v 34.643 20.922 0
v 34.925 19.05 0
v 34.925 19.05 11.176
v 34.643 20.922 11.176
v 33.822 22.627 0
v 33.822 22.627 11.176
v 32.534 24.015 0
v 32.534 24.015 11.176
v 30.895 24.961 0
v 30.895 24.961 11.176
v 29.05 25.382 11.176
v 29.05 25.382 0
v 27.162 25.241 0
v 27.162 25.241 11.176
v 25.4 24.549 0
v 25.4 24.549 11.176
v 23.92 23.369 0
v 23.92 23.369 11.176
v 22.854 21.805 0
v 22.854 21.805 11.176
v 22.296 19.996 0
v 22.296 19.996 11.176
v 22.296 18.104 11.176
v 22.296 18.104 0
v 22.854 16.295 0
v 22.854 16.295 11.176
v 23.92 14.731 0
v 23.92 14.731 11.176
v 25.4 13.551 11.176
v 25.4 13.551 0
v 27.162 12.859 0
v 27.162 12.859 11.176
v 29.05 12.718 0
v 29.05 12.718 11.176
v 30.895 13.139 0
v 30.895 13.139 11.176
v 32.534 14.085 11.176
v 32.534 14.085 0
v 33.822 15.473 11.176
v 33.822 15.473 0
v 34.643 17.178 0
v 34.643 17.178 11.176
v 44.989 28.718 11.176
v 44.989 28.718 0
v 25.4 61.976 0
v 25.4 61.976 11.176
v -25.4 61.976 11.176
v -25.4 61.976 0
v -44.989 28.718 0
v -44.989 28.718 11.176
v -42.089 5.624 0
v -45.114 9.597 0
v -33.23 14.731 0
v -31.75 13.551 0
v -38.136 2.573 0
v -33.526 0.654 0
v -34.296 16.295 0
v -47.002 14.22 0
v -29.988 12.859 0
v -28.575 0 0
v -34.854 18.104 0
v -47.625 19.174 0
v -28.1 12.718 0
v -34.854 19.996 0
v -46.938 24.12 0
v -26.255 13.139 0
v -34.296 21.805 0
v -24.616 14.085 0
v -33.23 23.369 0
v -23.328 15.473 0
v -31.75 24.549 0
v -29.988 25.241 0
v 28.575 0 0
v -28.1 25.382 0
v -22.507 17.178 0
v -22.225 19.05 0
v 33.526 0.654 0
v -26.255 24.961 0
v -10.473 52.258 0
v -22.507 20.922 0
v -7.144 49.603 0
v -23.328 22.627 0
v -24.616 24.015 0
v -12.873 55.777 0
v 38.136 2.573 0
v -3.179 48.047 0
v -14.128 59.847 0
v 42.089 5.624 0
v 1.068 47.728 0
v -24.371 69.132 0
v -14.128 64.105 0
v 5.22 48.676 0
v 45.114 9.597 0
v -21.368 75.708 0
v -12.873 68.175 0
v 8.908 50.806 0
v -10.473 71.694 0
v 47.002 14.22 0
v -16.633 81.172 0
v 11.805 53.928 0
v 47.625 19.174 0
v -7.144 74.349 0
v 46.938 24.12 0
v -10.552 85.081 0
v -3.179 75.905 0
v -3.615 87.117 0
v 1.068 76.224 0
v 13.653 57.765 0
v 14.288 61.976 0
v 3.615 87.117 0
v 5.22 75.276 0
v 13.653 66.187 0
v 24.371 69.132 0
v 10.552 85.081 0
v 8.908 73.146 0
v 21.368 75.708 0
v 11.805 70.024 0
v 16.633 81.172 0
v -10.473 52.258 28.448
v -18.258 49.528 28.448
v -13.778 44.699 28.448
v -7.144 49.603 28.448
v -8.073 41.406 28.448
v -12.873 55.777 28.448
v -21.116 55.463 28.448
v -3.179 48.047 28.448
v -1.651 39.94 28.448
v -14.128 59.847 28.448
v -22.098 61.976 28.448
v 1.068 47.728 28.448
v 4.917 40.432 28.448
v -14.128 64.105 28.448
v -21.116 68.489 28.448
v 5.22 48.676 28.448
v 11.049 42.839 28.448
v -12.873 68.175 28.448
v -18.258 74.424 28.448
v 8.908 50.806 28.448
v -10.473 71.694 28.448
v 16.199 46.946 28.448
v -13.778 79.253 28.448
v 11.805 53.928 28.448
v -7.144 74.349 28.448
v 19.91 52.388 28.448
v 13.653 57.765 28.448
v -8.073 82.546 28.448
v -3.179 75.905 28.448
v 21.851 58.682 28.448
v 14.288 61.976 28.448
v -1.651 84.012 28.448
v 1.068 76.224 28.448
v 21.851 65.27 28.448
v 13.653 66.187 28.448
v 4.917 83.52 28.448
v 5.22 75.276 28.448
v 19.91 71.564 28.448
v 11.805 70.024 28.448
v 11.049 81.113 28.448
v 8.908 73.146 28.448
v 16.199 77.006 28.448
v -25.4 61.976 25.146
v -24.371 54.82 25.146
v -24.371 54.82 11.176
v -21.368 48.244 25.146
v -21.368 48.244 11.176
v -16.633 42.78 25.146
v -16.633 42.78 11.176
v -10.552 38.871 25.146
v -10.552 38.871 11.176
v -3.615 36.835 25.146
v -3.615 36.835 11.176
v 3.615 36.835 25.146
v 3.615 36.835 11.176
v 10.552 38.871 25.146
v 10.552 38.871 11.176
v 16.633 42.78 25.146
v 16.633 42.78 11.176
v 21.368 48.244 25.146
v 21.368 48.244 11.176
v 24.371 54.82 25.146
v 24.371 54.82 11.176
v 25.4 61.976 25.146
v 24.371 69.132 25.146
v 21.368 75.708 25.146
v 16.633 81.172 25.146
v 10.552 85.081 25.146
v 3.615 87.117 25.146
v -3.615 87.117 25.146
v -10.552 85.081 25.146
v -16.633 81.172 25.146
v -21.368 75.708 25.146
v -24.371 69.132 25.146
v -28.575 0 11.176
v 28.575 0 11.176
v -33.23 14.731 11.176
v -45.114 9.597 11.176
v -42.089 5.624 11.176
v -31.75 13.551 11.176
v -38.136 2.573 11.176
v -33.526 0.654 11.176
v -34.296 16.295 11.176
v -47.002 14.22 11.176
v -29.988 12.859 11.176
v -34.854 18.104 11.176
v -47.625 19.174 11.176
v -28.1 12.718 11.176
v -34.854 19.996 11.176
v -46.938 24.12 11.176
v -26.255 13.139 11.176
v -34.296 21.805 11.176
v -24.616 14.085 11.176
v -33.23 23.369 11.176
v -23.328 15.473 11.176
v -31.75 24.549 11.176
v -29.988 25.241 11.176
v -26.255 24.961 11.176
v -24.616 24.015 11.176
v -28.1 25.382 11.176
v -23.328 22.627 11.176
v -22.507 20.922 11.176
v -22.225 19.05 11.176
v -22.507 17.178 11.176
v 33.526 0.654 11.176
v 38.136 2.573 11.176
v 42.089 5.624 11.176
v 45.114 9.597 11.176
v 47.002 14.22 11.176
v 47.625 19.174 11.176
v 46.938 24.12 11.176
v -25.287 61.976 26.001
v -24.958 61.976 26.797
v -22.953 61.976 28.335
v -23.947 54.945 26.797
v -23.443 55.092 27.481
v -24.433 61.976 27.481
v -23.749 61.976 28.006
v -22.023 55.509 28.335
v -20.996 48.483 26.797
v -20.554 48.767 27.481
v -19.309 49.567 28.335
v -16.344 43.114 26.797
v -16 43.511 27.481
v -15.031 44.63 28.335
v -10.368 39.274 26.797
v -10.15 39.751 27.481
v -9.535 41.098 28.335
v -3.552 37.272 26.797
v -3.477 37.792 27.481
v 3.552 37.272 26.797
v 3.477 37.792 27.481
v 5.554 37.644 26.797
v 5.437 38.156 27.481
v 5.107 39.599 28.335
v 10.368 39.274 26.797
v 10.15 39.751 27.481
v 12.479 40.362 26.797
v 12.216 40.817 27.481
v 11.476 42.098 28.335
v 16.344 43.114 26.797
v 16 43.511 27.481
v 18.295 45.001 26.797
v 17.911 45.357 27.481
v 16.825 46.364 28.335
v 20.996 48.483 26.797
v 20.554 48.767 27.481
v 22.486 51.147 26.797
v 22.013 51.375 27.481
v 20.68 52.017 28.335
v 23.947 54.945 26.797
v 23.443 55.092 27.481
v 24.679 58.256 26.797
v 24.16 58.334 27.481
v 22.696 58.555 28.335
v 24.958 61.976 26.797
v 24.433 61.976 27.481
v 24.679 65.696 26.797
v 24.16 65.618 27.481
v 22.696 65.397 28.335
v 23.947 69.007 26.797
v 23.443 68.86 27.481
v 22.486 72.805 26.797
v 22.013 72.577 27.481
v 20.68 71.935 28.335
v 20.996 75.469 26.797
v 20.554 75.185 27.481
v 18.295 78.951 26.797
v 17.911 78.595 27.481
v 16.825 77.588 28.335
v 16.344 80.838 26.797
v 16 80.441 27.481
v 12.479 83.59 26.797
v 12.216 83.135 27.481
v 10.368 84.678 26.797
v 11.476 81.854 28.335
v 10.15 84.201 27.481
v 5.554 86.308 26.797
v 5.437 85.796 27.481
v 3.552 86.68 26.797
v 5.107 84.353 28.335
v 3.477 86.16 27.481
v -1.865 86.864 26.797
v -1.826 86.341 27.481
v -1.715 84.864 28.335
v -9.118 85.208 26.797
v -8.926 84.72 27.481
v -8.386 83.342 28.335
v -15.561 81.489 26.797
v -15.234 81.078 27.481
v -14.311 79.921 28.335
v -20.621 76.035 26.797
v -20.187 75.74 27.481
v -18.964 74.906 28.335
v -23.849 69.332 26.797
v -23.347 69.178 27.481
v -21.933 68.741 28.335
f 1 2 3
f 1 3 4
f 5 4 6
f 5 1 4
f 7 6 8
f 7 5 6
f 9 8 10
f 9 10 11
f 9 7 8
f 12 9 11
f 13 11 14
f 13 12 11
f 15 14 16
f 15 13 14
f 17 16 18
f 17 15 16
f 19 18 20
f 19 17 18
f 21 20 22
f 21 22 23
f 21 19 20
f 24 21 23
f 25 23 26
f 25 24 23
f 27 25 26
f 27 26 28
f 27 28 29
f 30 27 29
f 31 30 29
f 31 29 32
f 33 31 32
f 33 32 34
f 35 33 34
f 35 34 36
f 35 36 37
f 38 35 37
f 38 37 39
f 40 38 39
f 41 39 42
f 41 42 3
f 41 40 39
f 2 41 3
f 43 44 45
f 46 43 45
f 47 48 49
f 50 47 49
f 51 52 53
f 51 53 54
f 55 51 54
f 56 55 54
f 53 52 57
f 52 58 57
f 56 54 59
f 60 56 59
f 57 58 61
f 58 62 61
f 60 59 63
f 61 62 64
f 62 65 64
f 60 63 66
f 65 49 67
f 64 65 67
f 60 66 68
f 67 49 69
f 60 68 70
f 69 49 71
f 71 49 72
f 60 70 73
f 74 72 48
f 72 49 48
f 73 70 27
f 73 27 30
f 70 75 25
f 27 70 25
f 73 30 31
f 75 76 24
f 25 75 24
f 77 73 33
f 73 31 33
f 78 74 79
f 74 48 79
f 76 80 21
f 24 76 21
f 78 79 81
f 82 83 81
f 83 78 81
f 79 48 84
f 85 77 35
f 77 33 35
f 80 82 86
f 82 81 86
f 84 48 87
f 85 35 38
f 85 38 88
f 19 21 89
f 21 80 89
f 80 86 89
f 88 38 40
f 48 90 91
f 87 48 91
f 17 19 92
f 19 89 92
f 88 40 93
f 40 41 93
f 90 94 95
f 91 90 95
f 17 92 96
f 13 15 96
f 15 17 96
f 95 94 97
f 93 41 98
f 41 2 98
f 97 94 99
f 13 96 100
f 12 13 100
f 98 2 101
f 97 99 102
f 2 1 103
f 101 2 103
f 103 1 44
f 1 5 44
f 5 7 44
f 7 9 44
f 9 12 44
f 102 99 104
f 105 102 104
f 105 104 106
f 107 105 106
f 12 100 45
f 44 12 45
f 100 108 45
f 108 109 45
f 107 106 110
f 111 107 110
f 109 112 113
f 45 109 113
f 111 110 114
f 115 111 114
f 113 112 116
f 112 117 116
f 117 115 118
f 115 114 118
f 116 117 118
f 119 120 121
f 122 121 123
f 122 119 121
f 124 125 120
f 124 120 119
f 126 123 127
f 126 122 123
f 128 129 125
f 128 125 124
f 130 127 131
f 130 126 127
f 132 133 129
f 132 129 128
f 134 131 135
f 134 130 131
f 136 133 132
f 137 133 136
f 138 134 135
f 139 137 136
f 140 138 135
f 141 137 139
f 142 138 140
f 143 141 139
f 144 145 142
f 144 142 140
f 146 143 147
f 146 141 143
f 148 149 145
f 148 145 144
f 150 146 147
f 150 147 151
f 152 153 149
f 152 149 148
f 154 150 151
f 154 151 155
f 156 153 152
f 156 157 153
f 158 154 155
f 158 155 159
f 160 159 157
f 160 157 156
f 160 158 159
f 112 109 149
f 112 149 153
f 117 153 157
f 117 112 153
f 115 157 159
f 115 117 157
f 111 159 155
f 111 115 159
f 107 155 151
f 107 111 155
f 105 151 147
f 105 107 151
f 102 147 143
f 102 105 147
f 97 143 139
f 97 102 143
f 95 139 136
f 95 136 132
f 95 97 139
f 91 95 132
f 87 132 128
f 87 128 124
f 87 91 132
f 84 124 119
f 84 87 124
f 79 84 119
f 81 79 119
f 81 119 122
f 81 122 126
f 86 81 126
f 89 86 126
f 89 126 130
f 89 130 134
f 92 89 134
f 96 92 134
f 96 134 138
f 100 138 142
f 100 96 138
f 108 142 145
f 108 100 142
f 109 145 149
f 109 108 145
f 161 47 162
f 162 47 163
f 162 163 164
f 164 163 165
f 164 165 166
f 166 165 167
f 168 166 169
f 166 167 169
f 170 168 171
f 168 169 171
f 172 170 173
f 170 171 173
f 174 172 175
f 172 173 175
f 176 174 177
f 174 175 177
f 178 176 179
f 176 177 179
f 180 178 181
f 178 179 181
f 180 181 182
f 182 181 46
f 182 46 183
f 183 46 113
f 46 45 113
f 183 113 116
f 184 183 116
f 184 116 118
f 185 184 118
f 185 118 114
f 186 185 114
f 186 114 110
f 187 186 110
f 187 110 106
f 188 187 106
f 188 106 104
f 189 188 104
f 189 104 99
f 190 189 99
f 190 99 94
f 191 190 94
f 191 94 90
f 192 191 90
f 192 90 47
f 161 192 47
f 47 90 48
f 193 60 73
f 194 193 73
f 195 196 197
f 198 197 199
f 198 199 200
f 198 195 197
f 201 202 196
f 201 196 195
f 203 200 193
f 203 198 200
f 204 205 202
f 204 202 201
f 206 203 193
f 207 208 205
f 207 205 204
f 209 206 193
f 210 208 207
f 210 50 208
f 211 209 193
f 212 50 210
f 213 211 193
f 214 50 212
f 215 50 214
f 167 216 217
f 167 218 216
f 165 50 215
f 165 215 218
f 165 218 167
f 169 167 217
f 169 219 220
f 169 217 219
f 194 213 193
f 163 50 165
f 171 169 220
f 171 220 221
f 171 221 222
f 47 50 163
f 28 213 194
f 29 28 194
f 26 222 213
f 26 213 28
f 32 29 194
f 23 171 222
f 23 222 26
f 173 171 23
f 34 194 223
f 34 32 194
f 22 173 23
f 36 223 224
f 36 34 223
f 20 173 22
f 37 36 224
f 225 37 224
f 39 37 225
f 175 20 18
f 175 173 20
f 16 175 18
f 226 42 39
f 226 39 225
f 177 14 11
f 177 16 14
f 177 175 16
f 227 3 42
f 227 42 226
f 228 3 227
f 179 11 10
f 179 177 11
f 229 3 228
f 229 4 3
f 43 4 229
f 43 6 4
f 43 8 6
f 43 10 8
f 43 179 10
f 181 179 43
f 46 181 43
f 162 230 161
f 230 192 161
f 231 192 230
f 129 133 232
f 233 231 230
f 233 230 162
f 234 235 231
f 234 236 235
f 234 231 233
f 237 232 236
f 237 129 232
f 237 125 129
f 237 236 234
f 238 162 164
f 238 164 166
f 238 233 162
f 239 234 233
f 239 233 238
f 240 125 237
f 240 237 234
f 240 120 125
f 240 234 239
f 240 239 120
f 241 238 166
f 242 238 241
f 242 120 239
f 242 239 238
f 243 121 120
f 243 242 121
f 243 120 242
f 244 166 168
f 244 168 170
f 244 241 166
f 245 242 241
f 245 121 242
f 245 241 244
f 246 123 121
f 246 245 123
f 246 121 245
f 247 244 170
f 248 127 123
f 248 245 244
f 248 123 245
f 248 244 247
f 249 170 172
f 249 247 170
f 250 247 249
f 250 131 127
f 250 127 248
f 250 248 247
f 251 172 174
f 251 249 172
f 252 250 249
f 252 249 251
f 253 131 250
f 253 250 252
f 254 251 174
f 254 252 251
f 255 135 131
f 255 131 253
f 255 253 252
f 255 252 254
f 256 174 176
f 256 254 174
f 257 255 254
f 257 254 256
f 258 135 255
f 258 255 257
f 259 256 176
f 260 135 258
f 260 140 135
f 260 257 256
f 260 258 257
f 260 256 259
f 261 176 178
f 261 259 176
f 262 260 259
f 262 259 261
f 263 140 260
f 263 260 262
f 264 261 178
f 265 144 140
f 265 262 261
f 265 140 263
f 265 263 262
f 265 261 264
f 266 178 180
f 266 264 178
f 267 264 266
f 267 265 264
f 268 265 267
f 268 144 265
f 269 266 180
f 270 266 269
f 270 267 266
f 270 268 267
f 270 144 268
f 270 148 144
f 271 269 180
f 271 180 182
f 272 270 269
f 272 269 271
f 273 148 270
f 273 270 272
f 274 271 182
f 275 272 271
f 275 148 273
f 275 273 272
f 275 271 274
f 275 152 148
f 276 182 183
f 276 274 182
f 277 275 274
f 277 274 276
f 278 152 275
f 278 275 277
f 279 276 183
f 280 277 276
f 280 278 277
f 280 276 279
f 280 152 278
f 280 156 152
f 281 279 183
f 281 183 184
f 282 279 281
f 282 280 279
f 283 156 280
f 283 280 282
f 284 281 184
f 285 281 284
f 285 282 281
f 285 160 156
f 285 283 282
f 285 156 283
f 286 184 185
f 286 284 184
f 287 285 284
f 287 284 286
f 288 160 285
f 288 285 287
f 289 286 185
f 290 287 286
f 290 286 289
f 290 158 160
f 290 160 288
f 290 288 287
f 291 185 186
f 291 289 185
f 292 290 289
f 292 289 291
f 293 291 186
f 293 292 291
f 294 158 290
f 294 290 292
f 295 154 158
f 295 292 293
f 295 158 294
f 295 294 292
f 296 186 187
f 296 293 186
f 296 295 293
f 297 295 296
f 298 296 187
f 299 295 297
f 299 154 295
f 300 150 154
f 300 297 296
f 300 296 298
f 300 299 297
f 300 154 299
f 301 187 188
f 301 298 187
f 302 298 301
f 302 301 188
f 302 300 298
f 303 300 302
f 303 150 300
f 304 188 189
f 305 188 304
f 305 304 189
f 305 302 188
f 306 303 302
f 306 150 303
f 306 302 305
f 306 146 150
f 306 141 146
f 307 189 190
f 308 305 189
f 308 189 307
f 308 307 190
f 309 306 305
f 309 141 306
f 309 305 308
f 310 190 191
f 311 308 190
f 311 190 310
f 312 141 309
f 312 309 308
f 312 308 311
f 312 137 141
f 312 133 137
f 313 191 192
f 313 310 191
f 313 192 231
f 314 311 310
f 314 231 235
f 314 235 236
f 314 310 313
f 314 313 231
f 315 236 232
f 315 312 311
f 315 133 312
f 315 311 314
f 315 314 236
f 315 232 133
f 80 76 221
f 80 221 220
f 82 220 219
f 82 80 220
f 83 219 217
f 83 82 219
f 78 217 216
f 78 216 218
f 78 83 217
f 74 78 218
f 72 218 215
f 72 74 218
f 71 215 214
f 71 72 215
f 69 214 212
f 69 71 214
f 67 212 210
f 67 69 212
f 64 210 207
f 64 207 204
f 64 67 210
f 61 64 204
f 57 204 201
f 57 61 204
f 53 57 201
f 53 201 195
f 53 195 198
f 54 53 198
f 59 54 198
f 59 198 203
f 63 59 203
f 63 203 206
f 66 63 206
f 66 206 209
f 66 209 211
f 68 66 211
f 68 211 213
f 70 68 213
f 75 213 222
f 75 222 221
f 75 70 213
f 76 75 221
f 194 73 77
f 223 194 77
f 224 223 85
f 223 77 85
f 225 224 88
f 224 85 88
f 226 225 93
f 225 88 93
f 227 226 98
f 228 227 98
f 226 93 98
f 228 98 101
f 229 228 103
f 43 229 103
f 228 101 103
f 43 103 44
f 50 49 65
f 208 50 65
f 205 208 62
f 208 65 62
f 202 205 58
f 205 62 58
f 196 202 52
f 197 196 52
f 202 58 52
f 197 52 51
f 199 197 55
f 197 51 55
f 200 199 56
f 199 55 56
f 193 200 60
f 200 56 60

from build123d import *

# Parameters (mm, degrees)
F0_R     = 14.2875
F1_DEPTH = 28.448
F0_R_2   = 6.35
F2_DEPTH = 11.176
F3_R     = 3.302


with BuildPart() as f1:
    # F0 (on Top) → F1 (new body)
    with BuildSketch(Plane.XY):
        with BuildLine():
            ThreePointArc((25.4, 61.976), (0, 87.376), (-25.4, 61.976))
            ThreePointArc((-25.4, 61.976), (0, 36.576), (25.4, 61.976))
        make_face()
        with Locations((0, 61.976)):
            Circle(F0_R, mode=Mode.SUBTRACT)
    extrude(amount=F1_DEPTH)

    # F0 (on Top) → F2 (join)
    with BuildSketch(Plane.XY):
        with BuildLine():
            Line((-28.575, 0), (0, 0))
            Line((0, 0), (28.575, 0))
            ThreePointArc((28.575, 0), (45.1140748574, 9.5968786709), (44.989265753, 28.7182149226))
            Line((44.989265753, 28.7182149226), (25.4, 61.976))
            ThreePointArc((25.4, 61.976), (0, 36.576), (-25.4, 61.976))
            Line((-25.4, 61.976), (-44.989265753, 28.7182149226))
            ThreePointArc((-44.989265753, 28.7182149226), (-45.1140748574, 9.5968786709), (-28.575, 0))
        make_face()
        with Locations((-28.575, 19.05)):
            Circle(F0_R_2, mode=Mode.SUBTRACT)
        with Locations((28.575, 19.05)):
            Circle(F0_R_2, mode=Mode.SUBTRACT)
    extrude(amount=F2_DEPTH)

    # F3
    f3_edges = [f1.edges().sort_by_distance(p)[0] for p in [
        (25.4, 61.976, 28.448),
    ]]
    fillet(f3_edges, radius=F3_R)


solid = f1.part
